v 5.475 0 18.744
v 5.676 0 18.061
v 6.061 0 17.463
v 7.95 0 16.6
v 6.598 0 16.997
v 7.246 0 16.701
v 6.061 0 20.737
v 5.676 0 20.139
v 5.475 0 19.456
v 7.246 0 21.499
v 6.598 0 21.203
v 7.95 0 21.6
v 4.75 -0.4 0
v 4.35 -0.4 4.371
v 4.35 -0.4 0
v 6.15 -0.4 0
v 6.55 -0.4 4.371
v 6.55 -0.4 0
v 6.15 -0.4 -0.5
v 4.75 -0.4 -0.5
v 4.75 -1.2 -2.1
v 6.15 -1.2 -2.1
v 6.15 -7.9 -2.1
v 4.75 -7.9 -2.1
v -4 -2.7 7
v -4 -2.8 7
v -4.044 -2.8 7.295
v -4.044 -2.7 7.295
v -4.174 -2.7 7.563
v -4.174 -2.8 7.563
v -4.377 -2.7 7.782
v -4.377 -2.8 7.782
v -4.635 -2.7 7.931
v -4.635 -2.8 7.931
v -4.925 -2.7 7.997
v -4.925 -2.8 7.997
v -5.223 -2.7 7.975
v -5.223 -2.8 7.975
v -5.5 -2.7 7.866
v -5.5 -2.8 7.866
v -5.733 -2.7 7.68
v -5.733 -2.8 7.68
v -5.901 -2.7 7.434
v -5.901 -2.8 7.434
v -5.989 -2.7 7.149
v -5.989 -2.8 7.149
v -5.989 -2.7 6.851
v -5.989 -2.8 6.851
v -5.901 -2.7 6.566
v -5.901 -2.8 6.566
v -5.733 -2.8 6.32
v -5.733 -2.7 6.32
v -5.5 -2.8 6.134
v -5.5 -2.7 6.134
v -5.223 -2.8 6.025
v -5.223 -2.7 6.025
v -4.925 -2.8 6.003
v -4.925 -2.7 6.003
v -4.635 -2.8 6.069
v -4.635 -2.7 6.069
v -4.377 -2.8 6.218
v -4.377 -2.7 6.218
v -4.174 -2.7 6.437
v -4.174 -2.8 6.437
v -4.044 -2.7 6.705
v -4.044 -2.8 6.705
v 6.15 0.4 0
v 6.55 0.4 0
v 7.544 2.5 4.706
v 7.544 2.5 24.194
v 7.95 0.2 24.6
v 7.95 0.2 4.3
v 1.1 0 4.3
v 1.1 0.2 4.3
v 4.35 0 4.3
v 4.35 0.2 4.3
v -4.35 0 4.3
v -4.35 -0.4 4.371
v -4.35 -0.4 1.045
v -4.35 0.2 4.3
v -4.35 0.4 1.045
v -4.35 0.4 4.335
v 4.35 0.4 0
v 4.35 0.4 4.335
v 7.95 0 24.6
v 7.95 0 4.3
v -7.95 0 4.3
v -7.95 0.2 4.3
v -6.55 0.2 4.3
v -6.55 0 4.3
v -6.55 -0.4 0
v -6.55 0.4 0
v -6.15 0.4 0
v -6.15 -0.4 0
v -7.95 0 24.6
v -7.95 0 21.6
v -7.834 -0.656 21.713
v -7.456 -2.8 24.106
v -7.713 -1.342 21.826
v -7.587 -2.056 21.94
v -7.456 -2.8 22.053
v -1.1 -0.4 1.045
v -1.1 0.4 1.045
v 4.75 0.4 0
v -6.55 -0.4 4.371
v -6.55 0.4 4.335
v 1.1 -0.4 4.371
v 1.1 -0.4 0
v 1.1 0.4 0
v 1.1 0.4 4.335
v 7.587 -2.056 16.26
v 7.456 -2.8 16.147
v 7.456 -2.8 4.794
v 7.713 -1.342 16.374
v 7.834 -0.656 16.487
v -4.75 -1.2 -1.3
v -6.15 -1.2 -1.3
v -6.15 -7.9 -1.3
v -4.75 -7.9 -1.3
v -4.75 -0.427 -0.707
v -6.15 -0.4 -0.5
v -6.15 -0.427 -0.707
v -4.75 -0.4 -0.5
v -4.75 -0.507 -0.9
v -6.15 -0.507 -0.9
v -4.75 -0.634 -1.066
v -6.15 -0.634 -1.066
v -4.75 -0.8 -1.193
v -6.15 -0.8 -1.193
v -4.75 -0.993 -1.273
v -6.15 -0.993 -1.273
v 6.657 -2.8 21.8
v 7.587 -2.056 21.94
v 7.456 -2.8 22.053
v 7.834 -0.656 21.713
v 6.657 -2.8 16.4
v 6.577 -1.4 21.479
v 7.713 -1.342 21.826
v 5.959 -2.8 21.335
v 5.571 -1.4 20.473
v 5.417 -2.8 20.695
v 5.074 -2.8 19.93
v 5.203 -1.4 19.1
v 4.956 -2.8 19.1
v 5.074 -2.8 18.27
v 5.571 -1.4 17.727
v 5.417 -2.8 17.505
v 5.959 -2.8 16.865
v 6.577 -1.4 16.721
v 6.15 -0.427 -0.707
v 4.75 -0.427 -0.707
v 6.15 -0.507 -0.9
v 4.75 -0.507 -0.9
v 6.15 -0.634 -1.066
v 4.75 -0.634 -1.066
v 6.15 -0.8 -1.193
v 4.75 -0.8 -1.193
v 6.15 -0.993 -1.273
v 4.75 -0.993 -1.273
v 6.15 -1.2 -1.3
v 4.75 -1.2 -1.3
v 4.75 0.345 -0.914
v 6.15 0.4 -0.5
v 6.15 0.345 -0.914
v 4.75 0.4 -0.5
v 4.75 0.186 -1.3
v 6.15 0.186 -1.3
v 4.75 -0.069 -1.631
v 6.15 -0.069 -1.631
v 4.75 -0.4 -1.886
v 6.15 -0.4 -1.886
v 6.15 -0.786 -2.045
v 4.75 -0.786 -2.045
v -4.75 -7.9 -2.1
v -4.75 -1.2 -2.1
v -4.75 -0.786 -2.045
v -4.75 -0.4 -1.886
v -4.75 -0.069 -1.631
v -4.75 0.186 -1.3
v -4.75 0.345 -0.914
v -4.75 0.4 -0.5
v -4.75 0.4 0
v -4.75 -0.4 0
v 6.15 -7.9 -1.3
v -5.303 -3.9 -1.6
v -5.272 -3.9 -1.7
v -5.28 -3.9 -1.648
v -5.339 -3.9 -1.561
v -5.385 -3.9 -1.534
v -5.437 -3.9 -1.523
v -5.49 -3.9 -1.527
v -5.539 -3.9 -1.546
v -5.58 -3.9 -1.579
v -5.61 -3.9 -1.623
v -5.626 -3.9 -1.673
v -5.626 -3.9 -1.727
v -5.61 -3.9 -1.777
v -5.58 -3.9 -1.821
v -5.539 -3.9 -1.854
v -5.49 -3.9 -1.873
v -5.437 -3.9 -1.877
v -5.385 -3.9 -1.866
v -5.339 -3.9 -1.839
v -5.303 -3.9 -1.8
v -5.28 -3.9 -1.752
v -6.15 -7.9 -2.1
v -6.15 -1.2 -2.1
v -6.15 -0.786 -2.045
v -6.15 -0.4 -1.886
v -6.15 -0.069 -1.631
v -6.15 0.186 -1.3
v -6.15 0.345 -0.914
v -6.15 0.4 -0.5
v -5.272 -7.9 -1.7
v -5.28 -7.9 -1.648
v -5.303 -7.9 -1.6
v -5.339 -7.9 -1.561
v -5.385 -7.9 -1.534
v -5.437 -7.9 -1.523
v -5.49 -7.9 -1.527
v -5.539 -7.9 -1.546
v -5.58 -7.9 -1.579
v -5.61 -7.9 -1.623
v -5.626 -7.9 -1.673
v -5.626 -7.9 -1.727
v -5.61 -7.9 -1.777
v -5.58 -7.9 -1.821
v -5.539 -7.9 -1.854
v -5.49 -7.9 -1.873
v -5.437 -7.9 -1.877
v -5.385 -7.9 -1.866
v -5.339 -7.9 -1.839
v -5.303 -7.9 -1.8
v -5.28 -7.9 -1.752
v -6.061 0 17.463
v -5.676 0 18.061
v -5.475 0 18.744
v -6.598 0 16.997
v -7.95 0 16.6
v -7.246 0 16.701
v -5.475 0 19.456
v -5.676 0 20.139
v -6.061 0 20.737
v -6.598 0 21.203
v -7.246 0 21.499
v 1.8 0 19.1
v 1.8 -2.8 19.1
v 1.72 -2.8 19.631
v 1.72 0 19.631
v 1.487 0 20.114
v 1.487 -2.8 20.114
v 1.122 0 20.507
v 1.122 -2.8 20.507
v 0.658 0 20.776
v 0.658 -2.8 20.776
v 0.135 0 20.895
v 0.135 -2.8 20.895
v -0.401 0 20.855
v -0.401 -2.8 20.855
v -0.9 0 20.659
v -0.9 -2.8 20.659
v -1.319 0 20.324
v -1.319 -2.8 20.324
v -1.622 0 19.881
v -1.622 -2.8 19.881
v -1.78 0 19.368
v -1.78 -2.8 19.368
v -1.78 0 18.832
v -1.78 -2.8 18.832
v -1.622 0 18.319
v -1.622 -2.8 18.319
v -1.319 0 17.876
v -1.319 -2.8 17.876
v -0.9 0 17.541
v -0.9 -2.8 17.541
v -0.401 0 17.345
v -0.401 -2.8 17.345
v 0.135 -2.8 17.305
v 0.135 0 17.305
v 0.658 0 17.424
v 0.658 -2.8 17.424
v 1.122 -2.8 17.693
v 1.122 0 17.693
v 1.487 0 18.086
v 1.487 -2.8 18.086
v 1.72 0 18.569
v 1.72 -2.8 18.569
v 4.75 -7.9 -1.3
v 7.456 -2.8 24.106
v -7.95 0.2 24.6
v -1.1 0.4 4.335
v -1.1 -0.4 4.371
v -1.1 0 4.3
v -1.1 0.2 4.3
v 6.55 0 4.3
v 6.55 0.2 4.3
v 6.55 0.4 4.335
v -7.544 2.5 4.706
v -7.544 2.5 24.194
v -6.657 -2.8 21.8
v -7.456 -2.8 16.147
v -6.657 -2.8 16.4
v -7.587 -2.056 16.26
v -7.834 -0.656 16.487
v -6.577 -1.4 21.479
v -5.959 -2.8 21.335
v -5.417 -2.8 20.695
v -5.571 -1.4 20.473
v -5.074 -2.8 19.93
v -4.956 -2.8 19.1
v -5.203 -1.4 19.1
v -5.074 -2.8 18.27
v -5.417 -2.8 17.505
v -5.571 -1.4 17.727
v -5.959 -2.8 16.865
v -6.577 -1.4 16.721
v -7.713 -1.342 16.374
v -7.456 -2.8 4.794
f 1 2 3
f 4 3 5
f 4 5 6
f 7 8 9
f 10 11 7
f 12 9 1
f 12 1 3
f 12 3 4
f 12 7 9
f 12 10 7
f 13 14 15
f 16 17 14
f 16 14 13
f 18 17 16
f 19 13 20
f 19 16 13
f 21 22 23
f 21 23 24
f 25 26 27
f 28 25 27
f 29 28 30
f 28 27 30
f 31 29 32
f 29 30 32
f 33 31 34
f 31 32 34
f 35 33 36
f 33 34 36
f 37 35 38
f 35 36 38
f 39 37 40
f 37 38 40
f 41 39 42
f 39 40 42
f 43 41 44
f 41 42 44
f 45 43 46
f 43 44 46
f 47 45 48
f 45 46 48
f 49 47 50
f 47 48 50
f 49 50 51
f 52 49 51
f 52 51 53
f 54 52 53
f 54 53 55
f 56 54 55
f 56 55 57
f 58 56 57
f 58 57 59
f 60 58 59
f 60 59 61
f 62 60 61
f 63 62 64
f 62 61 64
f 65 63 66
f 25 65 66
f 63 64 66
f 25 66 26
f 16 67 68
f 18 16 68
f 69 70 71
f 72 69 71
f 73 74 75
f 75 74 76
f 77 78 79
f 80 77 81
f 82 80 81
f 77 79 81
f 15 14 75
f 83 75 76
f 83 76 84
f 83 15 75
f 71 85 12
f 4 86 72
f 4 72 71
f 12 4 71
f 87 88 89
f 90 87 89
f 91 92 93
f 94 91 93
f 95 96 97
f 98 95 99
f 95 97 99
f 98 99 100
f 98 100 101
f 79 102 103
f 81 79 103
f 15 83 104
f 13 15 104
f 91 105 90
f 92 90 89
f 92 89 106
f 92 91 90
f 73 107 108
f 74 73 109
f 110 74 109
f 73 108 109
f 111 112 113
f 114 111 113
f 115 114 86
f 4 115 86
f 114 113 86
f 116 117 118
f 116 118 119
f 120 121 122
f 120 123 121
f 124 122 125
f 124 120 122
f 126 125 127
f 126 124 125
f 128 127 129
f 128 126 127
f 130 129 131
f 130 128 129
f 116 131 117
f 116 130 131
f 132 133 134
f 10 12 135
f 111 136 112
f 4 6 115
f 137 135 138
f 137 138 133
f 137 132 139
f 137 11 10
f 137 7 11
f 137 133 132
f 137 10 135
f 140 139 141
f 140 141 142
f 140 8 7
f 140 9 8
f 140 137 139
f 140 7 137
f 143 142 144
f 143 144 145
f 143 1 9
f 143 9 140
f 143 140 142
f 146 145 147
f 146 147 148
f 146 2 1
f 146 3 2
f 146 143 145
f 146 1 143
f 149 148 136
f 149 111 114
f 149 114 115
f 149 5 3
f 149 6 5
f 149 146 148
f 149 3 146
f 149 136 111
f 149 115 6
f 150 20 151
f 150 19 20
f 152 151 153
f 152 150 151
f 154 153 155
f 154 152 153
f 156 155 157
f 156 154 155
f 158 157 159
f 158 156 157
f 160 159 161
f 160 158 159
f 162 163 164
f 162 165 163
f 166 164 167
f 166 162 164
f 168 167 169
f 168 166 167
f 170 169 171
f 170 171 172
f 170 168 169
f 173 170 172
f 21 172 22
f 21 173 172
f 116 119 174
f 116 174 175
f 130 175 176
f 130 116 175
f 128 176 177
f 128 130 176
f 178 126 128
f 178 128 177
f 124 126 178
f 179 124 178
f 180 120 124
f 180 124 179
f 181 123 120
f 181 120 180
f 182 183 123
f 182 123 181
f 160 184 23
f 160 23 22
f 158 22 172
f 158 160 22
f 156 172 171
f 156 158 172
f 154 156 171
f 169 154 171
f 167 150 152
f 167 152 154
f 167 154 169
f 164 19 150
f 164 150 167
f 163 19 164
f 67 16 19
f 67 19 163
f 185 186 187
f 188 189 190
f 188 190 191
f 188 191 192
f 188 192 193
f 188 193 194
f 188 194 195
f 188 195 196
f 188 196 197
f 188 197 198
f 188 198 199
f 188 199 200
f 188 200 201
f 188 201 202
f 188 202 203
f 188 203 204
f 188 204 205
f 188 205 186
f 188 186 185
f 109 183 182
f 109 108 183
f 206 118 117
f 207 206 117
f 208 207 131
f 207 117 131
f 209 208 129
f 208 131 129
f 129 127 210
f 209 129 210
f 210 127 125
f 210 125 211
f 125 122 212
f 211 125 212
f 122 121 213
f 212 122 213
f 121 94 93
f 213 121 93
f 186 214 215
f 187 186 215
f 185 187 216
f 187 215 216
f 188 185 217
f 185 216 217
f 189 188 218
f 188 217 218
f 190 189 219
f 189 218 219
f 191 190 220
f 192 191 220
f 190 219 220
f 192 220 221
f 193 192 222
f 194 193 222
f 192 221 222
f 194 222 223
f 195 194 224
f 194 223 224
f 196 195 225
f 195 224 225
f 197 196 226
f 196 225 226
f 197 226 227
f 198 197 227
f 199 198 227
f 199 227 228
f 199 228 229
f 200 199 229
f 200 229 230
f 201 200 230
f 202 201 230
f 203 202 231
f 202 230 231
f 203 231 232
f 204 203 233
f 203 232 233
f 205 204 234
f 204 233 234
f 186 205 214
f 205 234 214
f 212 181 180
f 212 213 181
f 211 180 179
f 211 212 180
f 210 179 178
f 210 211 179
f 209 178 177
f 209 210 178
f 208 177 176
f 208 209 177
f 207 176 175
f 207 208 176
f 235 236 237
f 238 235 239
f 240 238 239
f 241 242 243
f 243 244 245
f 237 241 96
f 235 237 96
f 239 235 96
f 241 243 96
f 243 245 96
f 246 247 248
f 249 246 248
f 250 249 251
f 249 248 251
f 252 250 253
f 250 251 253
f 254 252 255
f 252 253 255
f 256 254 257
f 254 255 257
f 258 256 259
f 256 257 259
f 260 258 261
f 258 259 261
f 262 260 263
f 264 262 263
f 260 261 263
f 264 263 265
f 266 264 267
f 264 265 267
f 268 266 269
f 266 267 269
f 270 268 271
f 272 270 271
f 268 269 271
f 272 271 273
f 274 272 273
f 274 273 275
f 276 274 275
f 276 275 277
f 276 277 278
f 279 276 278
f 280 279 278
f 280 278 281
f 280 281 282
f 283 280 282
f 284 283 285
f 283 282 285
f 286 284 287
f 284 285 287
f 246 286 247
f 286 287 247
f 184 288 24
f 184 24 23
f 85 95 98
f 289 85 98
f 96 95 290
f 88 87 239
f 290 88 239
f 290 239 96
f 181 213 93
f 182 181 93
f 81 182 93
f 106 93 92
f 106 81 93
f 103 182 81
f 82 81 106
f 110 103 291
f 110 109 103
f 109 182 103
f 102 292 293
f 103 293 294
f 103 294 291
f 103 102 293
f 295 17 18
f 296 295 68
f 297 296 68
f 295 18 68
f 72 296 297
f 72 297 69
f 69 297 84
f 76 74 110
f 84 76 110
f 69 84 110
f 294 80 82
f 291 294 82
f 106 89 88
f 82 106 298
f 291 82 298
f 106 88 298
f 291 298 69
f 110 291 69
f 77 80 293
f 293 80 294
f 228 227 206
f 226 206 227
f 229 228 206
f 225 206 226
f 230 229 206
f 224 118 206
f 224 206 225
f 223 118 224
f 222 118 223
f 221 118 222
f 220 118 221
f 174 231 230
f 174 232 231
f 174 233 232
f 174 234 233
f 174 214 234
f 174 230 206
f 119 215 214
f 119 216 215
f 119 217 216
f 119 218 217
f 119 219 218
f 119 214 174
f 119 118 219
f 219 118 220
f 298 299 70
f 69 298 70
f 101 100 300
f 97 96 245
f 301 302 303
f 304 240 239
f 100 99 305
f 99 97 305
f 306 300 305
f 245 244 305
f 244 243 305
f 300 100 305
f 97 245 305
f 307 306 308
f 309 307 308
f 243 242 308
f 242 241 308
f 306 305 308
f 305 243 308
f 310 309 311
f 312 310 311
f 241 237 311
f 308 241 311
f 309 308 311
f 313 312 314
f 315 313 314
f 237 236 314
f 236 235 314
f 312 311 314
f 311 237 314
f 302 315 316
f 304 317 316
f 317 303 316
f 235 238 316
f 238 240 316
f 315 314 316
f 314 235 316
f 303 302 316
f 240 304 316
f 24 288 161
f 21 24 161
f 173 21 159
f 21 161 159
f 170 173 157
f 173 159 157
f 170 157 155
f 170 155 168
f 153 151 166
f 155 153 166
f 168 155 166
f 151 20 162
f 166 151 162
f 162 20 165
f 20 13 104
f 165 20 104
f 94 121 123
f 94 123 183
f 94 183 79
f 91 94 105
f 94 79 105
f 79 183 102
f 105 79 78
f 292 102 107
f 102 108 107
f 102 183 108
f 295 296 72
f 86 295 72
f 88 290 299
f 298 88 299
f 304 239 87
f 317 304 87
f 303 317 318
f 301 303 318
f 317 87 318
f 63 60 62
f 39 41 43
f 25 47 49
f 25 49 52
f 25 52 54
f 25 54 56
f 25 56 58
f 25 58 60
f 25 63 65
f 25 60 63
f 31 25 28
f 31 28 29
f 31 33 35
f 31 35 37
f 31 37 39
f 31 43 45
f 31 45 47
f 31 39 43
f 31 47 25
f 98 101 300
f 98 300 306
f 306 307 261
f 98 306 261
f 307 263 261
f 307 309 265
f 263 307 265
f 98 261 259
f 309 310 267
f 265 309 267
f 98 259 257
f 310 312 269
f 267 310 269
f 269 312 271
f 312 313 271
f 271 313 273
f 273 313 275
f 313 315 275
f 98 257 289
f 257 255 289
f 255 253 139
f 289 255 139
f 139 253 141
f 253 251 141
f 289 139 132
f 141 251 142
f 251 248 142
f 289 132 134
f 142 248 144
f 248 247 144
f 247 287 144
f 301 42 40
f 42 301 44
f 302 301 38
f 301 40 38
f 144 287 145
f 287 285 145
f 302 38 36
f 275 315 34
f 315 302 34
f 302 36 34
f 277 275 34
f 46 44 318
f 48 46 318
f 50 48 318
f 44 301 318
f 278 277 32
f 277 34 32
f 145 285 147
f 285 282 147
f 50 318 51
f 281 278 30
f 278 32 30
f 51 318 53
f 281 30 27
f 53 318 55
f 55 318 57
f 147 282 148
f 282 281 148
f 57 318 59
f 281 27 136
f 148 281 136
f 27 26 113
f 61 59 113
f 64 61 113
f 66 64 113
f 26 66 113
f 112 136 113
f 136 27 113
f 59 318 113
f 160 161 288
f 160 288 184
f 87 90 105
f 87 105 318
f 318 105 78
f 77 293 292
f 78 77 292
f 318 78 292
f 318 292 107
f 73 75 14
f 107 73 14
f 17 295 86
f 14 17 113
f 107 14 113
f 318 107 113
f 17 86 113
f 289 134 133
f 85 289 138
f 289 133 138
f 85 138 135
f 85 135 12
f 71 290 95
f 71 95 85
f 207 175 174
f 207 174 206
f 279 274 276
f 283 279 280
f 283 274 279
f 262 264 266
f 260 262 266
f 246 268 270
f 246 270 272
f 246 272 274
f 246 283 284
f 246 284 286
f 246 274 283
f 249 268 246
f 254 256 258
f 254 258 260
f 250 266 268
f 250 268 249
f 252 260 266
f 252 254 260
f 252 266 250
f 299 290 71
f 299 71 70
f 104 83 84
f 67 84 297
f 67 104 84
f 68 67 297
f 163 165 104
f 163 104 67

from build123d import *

# Parameters (mm, degrees)
SKETCH_3_W          = 15.9
SKETCH_3_H          = 5.3
EXTRUDE_1_DEPTH     = 20.3
SKETCH_4_W          = 2.2
SKETCH_4_H          = 0.8
EXTRUDE_2_DEPTH     = 4.3
SKETCH_6_W          = 1.4
SKETCH_6_H          = 0.8
EXTRUDE_3_DEPTH     = 10.5
SKETCH_7_R          = 1.8
CUT_EXTRUDE_1_DEPTH = 2.8
SKETCH_8_R          = 1
CUT_EXTRUDE_2_DEPTH = 0.1
CHAMFER_1_SIZE      = 2.8
CHAMFER_1_SIZE_2    = 0.493715546
CHAMFER_2_SIZE      = 0.405552056
CHAMFER_2_SIZE_2    = 2.3
SKETCH_9_W          = 1.4
SKETCH_9_H          = 0.8
CUT_EXTRUDE_3_DEPTH = 10.5
SKETCH_10_W         = 1.045125196
SKETCH_10_H         = 0.8
EXTRUDE_4_DEPTH     = 3.25
SKETCH_11_W         = 1.4
SKETCH_11_H         = 0.8
EXTRUDE_5_DEPTH     = 7.5
SKETCH_12_W         = 1.4
SKETCH_12_H         = 0.8
CUT_EXTRUDE_4_DEPTH = 8.4
FILLET_1_R          = 0.8
FILLET_2_R          = 1.6
SKETCH_13_R         = 0.177871301
CUT_EXTRUDE_5_DEPTH = 4


with BuildPart() as part:
    # Эскиз3 → Вытянуть1 (new body)
    with BuildSketch(Plane.XY.offset(4.3)):
        with Locations((0, -0.15)):
            Rectangle(SKETCH_3_W, SKETCH_3_H)
    extrude(amount=EXTRUDE_1_DEPTH)

    # Эскиз4 → Вытянуть2 (add)
    with BuildSketch(Plane.XY):
        Rectangle(SKETCH_4_W, SKETCH_4_H)
        with Locations((-5.45, 0)):
            Rectangle(SKETCH_4_W, SKETCH_4_H)
        with Locations((5.45, 0)):
            Rectangle(SKETCH_4_W, SKETCH_4_H)
    extrude(amount=EXTRUDE_2_DEPTH)

    # Эскиз6 → Вытянуть3 (add)
    with BuildSketch(Plane.XY):
        Rectangle(SKETCH_6_W, SKETCH_6_H)
        with Locations((-5.45, 0)):
            Rectangle(SKETCH_6_W, SKETCH_6_H)
        with Locations((5.45, 0)):
            Rectangle(SKETCH_6_W, SKETCH_6_H)
    extrude(amount=-EXTRUDE_3_DEPTH)

    # Эскиз7 → Вырез-Вытянуть1 (cut)
    with BuildSketch(Plane.XZ.offset(2.8)):
        with Locations((0, 19.1)):
            Circle(SKETCH_7_R)
        with BuildLine():
            Line((7.95, 16.6), (7.95, 21.6))
            ThreePointArc((7.95, 21.6), (5.45, 19.1), (7.95, 16.6))
        make_face()
        with BuildLine():
            Line((-7.95, 16.6), (-7.95, 21.6))
            ThreePointArc((-7.95, 21.6), (-5.45, 19.1), (-7.95, 16.6))
        make_face()
    extrude(amount=-CUT_EXTRUDE_1_DEPTH, mode=Mode.SUBTRACT)

    # Эскиз8 → Вырез-Вытянуть2 (cut)
    with BuildSketch(Plane.XZ.offset(2.8)):
        with Locations((-5, 7)):
            Circle(SKETCH_8_R)
    extrude(amount=-CUT_EXTRUDE_2_DEPTH, mode=Mode.SUBTRACT)

    # Фаска1
    # the kernel refuses this chamfer: 2.8, 0.493715546 mm, written as the material it takes off along each edge
    with BuildSketch(Plane(origin=(15.22590863, -2.8, 4.3), x_dir=(0, 0.9999776716360547, -0.006682531656101734), z_dir=(-1, 0, 0))) as chamfer_1_piece_1_section:
        Polygon((CHAMFER_1_SIZE * 0.999977671636, -CHAMFER_1_SIZE * 0.0066825316561), (-CHAMFER_1_SIZE_2 * 0.00668253165588, -CHAMFER_1_SIZE_2 * 0.999977671603), (0, 0), align=None)
    chamfer_1_piece_1 = extrude(amount=30.45181726, mode=Mode.PRIVATE)
    chamfer_1_piece_1 = split(chamfer_1_piece_1, bisect_by=Plane(origin=(6.55, -0.266666667, 4.323510264), z_dir=(1, 0, 0)), keep=Keep.TOP, mode=Mode.PRIVATE)
    add(chamfer_1_piece_1, mode=Mode.SUBTRACT)
    with BuildSketch(Plane(origin=(15.22590863, -2.8, 4.3), x_dir=(0, 0.9999776716360547, -0.006682531656101734), z_dir=(-1, 0, 0))) as chamfer_1_piece_2_section:
        Polygon((CHAMFER_1_SIZE * 0.999977671636, -CHAMFER_1_SIZE * 0.0066825316561), (-CHAMFER_1_SIZE_2 * 0.00668253165588, -CHAMFER_1_SIZE_2 * 0.999977671603), (0, 0), align=None)
    chamfer_1_piece_2 = extrude(amount=30.45181726, mode=Mode.PRIVATE)
    chamfer_1_piece_2 = split(chamfer_1_piece_2, bisect_by=Plane(origin=(5.45, -0.4, 4.467510632), z_dir=(0, -1, 0)), keep=Keep.TOP, mode=Mode.PRIVATE)
    add(chamfer_1_piece_2, mode=Mode.SUBTRACT)
    with BuildSketch(Plane(origin=(15.22590863, -2.8, 4.3), x_dir=(0, 0.9999776716360547, -0.006682531656101734), z_dir=(-1, 0, 0))) as chamfer_1_piece_3_section:
        Polygon((CHAMFER_1_SIZE * 0.999977671636, -CHAMFER_1_SIZE * 0.0066825316561), (-CHAMFER_1_SIZE_2 * 0.00668253165588, -CHAMFER_1_SIZE_2 * 0.999977671603), (0, 0), align=None)
    chamfer_1_piece_3 = extrude(amount=30.45181726, mode=Mode.PRIVATE)
    chamfer_1_piece_3 = split(chamfer_1_piece_3, bisect_by=Plane(origin=(4.35, -0.266666667, 4.323510264), z_dir=(-1, 0, 0)), keep=Keep.TOP, mode=Mode.PRIVATE)
    chamfer_1_piece_3 = split(chamfer_1_piece_3, bisect_by=Plane(origin=(1.1, -0.266666667, 4.323510264), z_dir=(1, 0, 0)), keep=Keep.TOP, mode=Mode.PRIVATE)
    add(chamfer_1_piece_3, mode=Mode.SUBTRACT)
    with BuildSketch(Plane(origin=(15.22590863, -2.8, 4.3), x_dir=(0, 0.9999776716360547, -0.006682531656101734), z_dir=(-1, 0, 0))) as chamfer_1_piece_4_section:
        Polygon((CHAMFER_1_SIZE * 0.999977671636, -CHAMFER_1_SIZE * 0.0066825316561), (-CHAMFER_1_SIZE_2 * 0.00668253165588, -CHAMFER_1_SIZE_2 * 0.999977671603), (0, 0), align=None)
    chamfer_1_piece_4 = extrude(amount=30.45181726, mode=Mode.PRIVATE)
    chamfer_1_piece_4 = split(chamfer_1_piece_4, bisect_by=Plane(origin=(-4.35, -0.266666667, 4.323510264), z_dir=(1, 0, 0)), keep=Keep.TOP, mode=Mode.PRIVATE)
    chamfer_1_piece_4 = split(chamfer_1_piece_4, bisect_by=Plane(origin=(-1.1, -0.266666667, 4.323510264), z_dir=(-1, 0, 0)), keep=Keep.TOP, mode=Mode.PRIVATE)
    add(chamfer_1_piece_4, mode=Mode.SUBTRACT)
    with BuildSketch(Plane(origin=(15.22590863, -2.8, 4.3), x_dir=(0, 0.9999776716360547, -0.006682531656101734), z_dir=(-1, 0, 0))) as chamfer_1_piece_5_section:
        Polygon((CHAMFER_1_SIZE * 0.999977671636, -CHAMFER_1_SIZE * 0.0066825316561), (-CHAMFER_1_SIZE_2 * 0.00668253165588, -CHAMFER_1_SIZE_2 * 0.999977671603), (0, 0), align=None)
    chamfer_1_piece_5 = extrude(amount=30.45181726, mode=Mode.PRIVATE)
    chamfer_1_piece_5 = split(chamfer_1_piece_5, bisect_by=Plane(origin=(-6.55, -0.266666667, 4.323510264), z_dir=(-1, 0, 0)), keep=Keep.TOP, mode=Mode.PRIVATE)
    add(chamfer_1_piece_5, mode=Mode.SUBTRACT)
    with BuildSketch(Plane(origin=(-7.95, -2.8, -2.97590863), x_dir=(-0.006682531656101734, 0.9999776716360547, 0), z_dir=(0, 0, 1))) as chamfer_1_piece_6:
        Polygon((CHAMFER_1_SIZE * 0.999977671636, -CHAMFER_1_SIZE * 0.0066825316561), (-CHAMFER_1_SIZE_2 * 0.00668253165588, -CHAMFER_1_SIZE_2 * 0.999977671603), (0, 0), align=None)
    extrude(amount=26.85181726, mode=Mode.SUBTRACT)
    with BuildSketch(Plane(origin=(-7.95, -2.8, 14.32409137), x_dir=(-0.006682531656101734, 0.9999776716360547, 0), z_dir=(0, 0, 1))) as chamfer_1_piece_7:
        Polygon((CHAMFER_1_SIZE * 0.999977671636, -CHAMFER_1_SIZE * 0.0066825316561), (-CHAMFER_1_SIZE_2 * 0.00668253165588, -CHAMFER_1_SIZE_2 * 0.999977671603), (0, 0), align=None)
    extrude(amount=17.55181726, mode=Mode.SUBTRACT)
    with BuildSketch(Plane(origin=(-7.95, -2.8, 19.1), x_dir=(-0.9999950652018581, 0, 0.0031415874858794286), z_dir=(-0.0031415874858794286, 0, -0.9999950652018581))) as chamfer_1_piece_8:
        Polygon((2.5 + CHAMFER_1_SIZE_2, 0), (2.5, CHAMFER_1_SIZE), (2.5, 0), align=None)
    revolve(axis=Axis((-7.95, -2.8, 19.1), (0, 1, 0)), revolution_arc=359.64, mode=Mode.SUBTRACT)
    with BuildSketch(Plane(origin=(15.22590863, -2.8, 24.6), x_dir=(0, 0.9999776716360547, 0.006682531656101123), z_dir=(-1, 0, 0))) as chamfer_1_piece_9:
        Polygon((CHAMFER_1_SIZE * 0.999977671636, CHAMFER_1_SIZE * 0.0066825316561), (-CHAMFER_1_SIZE_2 * 0.00668253165588, CHAMFER_1_SIZE_2 * 0.999977671603), (0, 0), align=None)
    extrude(amount=30.45181726, mode=Mode.SUBTRACT)
    with BuildSketch(Plane(origin=(7.95, -2.8, 14.32409137), x_dir=(-0.9776715712462587, -0.21013876076743054, 0), z_dir=(0, 0, 1))) as chamfer_1_piece_10:
        Polygon((CHAMFER_1_SIZE_2 * 0.977671571214, -CHAMFER_1_SIZE_2 * 0.21013876076), (-CHAMFER_1_SIZE * 0.210138760767, -CHAMFER_1_SIZE * 0.977671571246), (0, 0), align=None)
    extrude(amount=17.55181726, mode=Mode.SUBTRACT)
    with BuildSketch(Plane(origin=(7.95, -2.8, -2.97590863), x_dir=(-0.9776715712462587, -0.21013876076743054, 0), z_dir=(0, 0, 1))) as chamfer_1_piece_11:
        Polygon((CHAMFER_1_SIZE_2 * 0.977671571214, -CHAMFER_1_SIZE_2 * 0.21013876076), (-CHAMFER_1_SIZE * 0.210138760767, -CHAMFER_1_SIZE * 0.977671571246), (0, 0), align=None)
    extrude(amount=26.85181726, mode=Mode.SUBTRACT)
    with BuildSketch(Plane(origin=(7.95, -2.8, 19.1), x_dir=(0.9999950652018581, 0, 0.0031415874858794286), z_dir=(0.0031415874858794286, 0, -0.9999950652018581))) as chamfer_1_piece_12:
        Polygon((2.5 + CHAMFER_1_SIZE_2, 0), (2.5, -CHAMFER_1_SIZE), (2.5, 0), align=None)
    revolve(axis=Axis((7.95, -2.8, 19.1), (0, -1, 0)), revolution_arc=359.64, mode=Mode.SUBTRACT)

    # Фаска2
    # the kernel refuses this chamfer: 2.3, 0.405552056 mm, written as the material it takes off along each edge
    with BuildSketch(Plane(origin=(7.95, 2.5, -1.676639232), x_dir=(-0.9776715712462586, 0.21013876076743143, 0), z_dir=(0, 0, 1))) as chamfer_2_piece_1:
        Polygon((CHAMFER_2_SIZE * 0.977671570353, CHAMFER_2_SIZE * 0.210138760575), (-CHAMFER_2_SIZE_2 * 0.210138760767, CHAMFER_2_SIZE_2 * 0.977671571246), (0, 0), align=None)
    extrude(amount=32.253278464, mode=Mode.SUBTRACT)
    with BuildSketch(Plane(origin=(-13.926639232, 2.5, 24.6), x_dir=(0, -0.9999776716360546, 0.0066825316561023975), z_dir=(1, 0, 0))) as chamfer_2_piece_2:
        Polygon((CHAMFER_2_SIZE_2 * 0.999977671636, CHAMFER_2_SIZE_2 * 0.0066825316561), (-CHAMFER_2_SIZE * 0.00668253165, CHAMFER_2_SIZE * 0.999977670722), (0, 0), align=None)
    extrude(amount=27.853278464, mode=Mode.SUBTRACT)
    with BuildSketch(Plane(origin=(-7.95, 2.5, -1.676639232), x_dir=(-0.006682531656101655, -0.9999776716360548, 0), z_dir=(0, 0, 1))) as chamfer_2_piece_3:
        Polygon((CHAMFER_2_SIZE_2 * 0.999977671636, CHAMFER_2_SIZE_2 * 0.0066825316561), (-CHAMFER_2_SIZE * 0.00668253165, CHAMFER_2_SIZE * 0.999977670722), (0, 0), align=None)
    extrude(amount=32.253278464, mode=Mode.SUBTRACT)
    with BuildSketch(Plane(origin=(-13.926639232, 2.5, 4.3), x_dir=(0, -0.9999776716360546, -0.006682531656101654), z_dir=(1, 0, 0))) as chamfer_2_piece_4_section:
        Polygon((CHAMFER_2_SIZE_2 * 0.999977671636, -CHAMFER_2_SIZE_2 * 0.0066825316561), (-CHAMFER_2_SIZE * 0.00668253165, -CHAMFER_2_SIZE * 0.999977670722), (0, 0), align=None)
    chamfer_2_piece_4 = extrude(amount=27.853278464, mode=Mode.PRIVATE)
    chamfer_2_piece_4 = split(chamfer_2_piece_4, bisect_by=Plane(origin=(-6.55, 0.333333333, 4.311755132), z_dir=(-1, 0, 0)), keep=Keep.TOP, mode=Mode.PRIVATE)
    add(chamfer_2_piece_4, mode=Mode.SUBTRACT)
    with BuildSketch(Plane(origin=(-13.926639232, 2.5, 4.3), x_dir=(0, -0.9999776716360546, -0.006682531656101654), z_dir=(1, 0, 0))) as chamfer_2_piece_5_section:
        Polygon((CHAMFER_2_SIZE_2 * 0.999977671636, -CHAMFER_2_SIZE_2 * 0.0066825316561), (-CHAMFER_2_SIZE * 0.00668253165, -CHAMFER_2_SIZE * 0.999977670722), (0, 0), align=None)
    chamfer_2_piece_5 = extrude(amount=27.853278464, mode=Mode.PRIVATE)
    chamfer_2_piece_5 = split(chamfer_2_piece_5, bisect_by=Plane(origin=(-5.45, 0.4, 4.436124429), z_dir=(0, 1, 0)), keep=Keep.TOP, mode=Mode.PRIVATE)
    add(chamfer_2_piece_5, mode=Mode.SUBTRACT)
    with BuildSketch(Plane(origin=(-13.926639232, 2.5, 4.3), x_dir=(0, -0.9999776716360546, -0.006682531656101654), z_dir=(1, 0, 0))) as chamfer_2_piece_6_section:
        Polygon((CHAMFER_2_SIZE_2 * 0.999977671636, -CHAMFER_2_SIZE_2 * 0.0066825316561), (-CHAMFER_2_SIZE * 0.00668253165, -CHAMFER_2_SIZE * 0.999977670722), (0, 0), align=None)
    chamfer_2_piece_6 = extrude(amount=27.853278464, mode=Mode.PRIVATE)
    chamfer_2_piece_6 = split(chamfer_2_piece_6, bisect_by=Plane(origin=(-4.35, 0.333333333, 4.311755132), z_dir=(1, 0, 0)), keep=Keep.TOP, mode=Mode.PRIVATE)
    chamfer_2_piece_6 = split(chamfer_2_piece_6, bisect_by=Plane(origin=(-1.1, 0.333333333, 4.311755132), z_dir=(-1, 0, 0)), keep=Keep.TOP, mode=Mode.PRIVATE)
    add(chamfer_2_piece_6, mode=Mode.SUBTRACT)
    with BuildSketch(Plane(origin=(-13.926639232, 2.5, 4.3), x_dir=(0, -0.9999776716360546, -0.006682531656101654), z_dir=(1, 0, 0))) as chamfer_2_piece_7_section:
        Polygon((CHAMFER_2_SIZE_2 * 0.999977671636, -CHAMFER_2_SIZE_2 * 0.0066825316561), (-CHAMFER_2_SIZE * 0.00668253165, -CHAMFER_2_SIZE * 0.999977670722), (0, 0), align=None)
    chamfer_2_piece_7 = extrude(amount=27.853278464, mode=Mode.PRIVATE)
    chamfer_2_piece_7 = split(chamfer_2_piece_7, bisect_by=Plane(origin=(1.1, 0.333333333, 4.311755132), z_dir=(1, 0, 0)), keep=Keep.TOP, mode=Mode.PRIVATE)
    chamfer_2_piece_7 = split(chamfer_2_piece_7, bisect_by=Plane(origin=(4.35, 0.333333333, 4.311755132), z_dir=(-1, 0, 0)), keep=Keep.TOP, mode=Mode.PRIVATE)
    add(chamfer_2_piece_7, mode=Mode.SUBTRACT)
    with BuildSketch(Plane(origin=(-13.926639232, 2.5, 4.3), x_dir=(0, -0.9999776716360546, -0.006682531656101654), z_dir=(1, 0, 0))) as chamfer_2_piece_8_section:
        Polygon((CHAMFER_2_SIZE_2 * 0.999977671636, -CHAMFER_2_SIZE_2 * 0.0066825316561), (-CHAMFER_2_SIZE * 0.00668253165, -CHAMFER_2_SIZE * 0.999977670722), (0, 0), align=None)
    chamfer_2_piece_8 = extrude(amount=27.853278464, mode=Mode.PRIVATE)
    chamfer_2_piece_8 = split(chamfer_2_piece_8, bisect_by=Plane(origin=(6.55, 0.333333333, 4.311755132), z_dir=(1, 0, 0)), keep=Keep.TOP, mode=Mode.PRIVATE)
    add(chamfer_2_piece_8, mode=Mode.SUBTRACT)

    # Эскиз9 → Вырез-Вытянуть3 (cut)
    with BuildSketch(Plane(origin=(0, 0, -10.5), x_dir=(-1, 0, 0), z_dir=(0, 0, -1))):
        Rectangle(SKETCH_9_W, SKETCH_9_H)
    extrude(amount=-CUT_EXTRUDE_3_DEPTH, mode=Mode.SUBTRACT)

    # Эскиз10 → Вытянуть4 (add)
    with BuildSketch(Plane.ZY.offset(1.1)):
        with Locations((0.522562598, 0)):
            Rectangle(SKETCH_10_W, SKETCH_10_H)
    extrude(amount=EXTRUDE_4_DEPTH)

    # Эскиз11 → Вытянуть5 (add)
    with BuildSketch(Plane.XZ.offset(0.4)):
        with Locations((-5.45, -1.7)):
            Rectangle(SKETCH_11_W, SKETCH_11_H)
        with Locations((5.45, -1.7)):
            Rectangle(SKETCH_11_W, SKETCH_11_H)
    extrude(amount=EXTRUDE_5_DEPTH)

    # Эскиз12 → Вырез-Вытянуть4 (cut)
    with BuildSketch(Plane(origin=(0, 0, -10.5), x_dir=(-1, 0, 0), z_dir=(0, 0, -1))):
        with Locations((5.45, 0)):
            Rectangle(SKETCH_12_W, SKETCH_12_H)
        with Locations((-5.45, 0)):
            Rectangle(SKETCH_12_W, SKETCH_12_H)
    extrude(amount=-CUT_EXTRUDE_4_DEPTH, mode=Mode.SUBTRACT)

    # Скругление1
    fillet_1_edges = [part.edges().sort_by_distance(p)[0] for p in [
        (5.45, -0.4, -1.3),
        (-5.45, -0.4, -1.3),
    ]]
    fillet(fillet_1_edges, radius=FILLET_1_R)

    # Скругление2
    fillet_2_edges = [part.edges().sort_by_distance(p)[0] for p in [
        (5.45, 0.4, -2.1),
        (-5.45, 0.4, -2.1),
    ]]
    fillet(fillet_2_edges, radius=FILLET_2_R)

    # Эскиз13 → Вырез-Вытянуть5 (cut)
    with BuildSketch(Plane.XZ.offset(7.9)):
        with Locations((-5.45, -1.7)):
            Circle(SKETCH_13_R)
    extrude(amount=-CUT_EXTRUDE_5_DEPTH, mode=Mode.SUBTRACT)


solid = part.part
